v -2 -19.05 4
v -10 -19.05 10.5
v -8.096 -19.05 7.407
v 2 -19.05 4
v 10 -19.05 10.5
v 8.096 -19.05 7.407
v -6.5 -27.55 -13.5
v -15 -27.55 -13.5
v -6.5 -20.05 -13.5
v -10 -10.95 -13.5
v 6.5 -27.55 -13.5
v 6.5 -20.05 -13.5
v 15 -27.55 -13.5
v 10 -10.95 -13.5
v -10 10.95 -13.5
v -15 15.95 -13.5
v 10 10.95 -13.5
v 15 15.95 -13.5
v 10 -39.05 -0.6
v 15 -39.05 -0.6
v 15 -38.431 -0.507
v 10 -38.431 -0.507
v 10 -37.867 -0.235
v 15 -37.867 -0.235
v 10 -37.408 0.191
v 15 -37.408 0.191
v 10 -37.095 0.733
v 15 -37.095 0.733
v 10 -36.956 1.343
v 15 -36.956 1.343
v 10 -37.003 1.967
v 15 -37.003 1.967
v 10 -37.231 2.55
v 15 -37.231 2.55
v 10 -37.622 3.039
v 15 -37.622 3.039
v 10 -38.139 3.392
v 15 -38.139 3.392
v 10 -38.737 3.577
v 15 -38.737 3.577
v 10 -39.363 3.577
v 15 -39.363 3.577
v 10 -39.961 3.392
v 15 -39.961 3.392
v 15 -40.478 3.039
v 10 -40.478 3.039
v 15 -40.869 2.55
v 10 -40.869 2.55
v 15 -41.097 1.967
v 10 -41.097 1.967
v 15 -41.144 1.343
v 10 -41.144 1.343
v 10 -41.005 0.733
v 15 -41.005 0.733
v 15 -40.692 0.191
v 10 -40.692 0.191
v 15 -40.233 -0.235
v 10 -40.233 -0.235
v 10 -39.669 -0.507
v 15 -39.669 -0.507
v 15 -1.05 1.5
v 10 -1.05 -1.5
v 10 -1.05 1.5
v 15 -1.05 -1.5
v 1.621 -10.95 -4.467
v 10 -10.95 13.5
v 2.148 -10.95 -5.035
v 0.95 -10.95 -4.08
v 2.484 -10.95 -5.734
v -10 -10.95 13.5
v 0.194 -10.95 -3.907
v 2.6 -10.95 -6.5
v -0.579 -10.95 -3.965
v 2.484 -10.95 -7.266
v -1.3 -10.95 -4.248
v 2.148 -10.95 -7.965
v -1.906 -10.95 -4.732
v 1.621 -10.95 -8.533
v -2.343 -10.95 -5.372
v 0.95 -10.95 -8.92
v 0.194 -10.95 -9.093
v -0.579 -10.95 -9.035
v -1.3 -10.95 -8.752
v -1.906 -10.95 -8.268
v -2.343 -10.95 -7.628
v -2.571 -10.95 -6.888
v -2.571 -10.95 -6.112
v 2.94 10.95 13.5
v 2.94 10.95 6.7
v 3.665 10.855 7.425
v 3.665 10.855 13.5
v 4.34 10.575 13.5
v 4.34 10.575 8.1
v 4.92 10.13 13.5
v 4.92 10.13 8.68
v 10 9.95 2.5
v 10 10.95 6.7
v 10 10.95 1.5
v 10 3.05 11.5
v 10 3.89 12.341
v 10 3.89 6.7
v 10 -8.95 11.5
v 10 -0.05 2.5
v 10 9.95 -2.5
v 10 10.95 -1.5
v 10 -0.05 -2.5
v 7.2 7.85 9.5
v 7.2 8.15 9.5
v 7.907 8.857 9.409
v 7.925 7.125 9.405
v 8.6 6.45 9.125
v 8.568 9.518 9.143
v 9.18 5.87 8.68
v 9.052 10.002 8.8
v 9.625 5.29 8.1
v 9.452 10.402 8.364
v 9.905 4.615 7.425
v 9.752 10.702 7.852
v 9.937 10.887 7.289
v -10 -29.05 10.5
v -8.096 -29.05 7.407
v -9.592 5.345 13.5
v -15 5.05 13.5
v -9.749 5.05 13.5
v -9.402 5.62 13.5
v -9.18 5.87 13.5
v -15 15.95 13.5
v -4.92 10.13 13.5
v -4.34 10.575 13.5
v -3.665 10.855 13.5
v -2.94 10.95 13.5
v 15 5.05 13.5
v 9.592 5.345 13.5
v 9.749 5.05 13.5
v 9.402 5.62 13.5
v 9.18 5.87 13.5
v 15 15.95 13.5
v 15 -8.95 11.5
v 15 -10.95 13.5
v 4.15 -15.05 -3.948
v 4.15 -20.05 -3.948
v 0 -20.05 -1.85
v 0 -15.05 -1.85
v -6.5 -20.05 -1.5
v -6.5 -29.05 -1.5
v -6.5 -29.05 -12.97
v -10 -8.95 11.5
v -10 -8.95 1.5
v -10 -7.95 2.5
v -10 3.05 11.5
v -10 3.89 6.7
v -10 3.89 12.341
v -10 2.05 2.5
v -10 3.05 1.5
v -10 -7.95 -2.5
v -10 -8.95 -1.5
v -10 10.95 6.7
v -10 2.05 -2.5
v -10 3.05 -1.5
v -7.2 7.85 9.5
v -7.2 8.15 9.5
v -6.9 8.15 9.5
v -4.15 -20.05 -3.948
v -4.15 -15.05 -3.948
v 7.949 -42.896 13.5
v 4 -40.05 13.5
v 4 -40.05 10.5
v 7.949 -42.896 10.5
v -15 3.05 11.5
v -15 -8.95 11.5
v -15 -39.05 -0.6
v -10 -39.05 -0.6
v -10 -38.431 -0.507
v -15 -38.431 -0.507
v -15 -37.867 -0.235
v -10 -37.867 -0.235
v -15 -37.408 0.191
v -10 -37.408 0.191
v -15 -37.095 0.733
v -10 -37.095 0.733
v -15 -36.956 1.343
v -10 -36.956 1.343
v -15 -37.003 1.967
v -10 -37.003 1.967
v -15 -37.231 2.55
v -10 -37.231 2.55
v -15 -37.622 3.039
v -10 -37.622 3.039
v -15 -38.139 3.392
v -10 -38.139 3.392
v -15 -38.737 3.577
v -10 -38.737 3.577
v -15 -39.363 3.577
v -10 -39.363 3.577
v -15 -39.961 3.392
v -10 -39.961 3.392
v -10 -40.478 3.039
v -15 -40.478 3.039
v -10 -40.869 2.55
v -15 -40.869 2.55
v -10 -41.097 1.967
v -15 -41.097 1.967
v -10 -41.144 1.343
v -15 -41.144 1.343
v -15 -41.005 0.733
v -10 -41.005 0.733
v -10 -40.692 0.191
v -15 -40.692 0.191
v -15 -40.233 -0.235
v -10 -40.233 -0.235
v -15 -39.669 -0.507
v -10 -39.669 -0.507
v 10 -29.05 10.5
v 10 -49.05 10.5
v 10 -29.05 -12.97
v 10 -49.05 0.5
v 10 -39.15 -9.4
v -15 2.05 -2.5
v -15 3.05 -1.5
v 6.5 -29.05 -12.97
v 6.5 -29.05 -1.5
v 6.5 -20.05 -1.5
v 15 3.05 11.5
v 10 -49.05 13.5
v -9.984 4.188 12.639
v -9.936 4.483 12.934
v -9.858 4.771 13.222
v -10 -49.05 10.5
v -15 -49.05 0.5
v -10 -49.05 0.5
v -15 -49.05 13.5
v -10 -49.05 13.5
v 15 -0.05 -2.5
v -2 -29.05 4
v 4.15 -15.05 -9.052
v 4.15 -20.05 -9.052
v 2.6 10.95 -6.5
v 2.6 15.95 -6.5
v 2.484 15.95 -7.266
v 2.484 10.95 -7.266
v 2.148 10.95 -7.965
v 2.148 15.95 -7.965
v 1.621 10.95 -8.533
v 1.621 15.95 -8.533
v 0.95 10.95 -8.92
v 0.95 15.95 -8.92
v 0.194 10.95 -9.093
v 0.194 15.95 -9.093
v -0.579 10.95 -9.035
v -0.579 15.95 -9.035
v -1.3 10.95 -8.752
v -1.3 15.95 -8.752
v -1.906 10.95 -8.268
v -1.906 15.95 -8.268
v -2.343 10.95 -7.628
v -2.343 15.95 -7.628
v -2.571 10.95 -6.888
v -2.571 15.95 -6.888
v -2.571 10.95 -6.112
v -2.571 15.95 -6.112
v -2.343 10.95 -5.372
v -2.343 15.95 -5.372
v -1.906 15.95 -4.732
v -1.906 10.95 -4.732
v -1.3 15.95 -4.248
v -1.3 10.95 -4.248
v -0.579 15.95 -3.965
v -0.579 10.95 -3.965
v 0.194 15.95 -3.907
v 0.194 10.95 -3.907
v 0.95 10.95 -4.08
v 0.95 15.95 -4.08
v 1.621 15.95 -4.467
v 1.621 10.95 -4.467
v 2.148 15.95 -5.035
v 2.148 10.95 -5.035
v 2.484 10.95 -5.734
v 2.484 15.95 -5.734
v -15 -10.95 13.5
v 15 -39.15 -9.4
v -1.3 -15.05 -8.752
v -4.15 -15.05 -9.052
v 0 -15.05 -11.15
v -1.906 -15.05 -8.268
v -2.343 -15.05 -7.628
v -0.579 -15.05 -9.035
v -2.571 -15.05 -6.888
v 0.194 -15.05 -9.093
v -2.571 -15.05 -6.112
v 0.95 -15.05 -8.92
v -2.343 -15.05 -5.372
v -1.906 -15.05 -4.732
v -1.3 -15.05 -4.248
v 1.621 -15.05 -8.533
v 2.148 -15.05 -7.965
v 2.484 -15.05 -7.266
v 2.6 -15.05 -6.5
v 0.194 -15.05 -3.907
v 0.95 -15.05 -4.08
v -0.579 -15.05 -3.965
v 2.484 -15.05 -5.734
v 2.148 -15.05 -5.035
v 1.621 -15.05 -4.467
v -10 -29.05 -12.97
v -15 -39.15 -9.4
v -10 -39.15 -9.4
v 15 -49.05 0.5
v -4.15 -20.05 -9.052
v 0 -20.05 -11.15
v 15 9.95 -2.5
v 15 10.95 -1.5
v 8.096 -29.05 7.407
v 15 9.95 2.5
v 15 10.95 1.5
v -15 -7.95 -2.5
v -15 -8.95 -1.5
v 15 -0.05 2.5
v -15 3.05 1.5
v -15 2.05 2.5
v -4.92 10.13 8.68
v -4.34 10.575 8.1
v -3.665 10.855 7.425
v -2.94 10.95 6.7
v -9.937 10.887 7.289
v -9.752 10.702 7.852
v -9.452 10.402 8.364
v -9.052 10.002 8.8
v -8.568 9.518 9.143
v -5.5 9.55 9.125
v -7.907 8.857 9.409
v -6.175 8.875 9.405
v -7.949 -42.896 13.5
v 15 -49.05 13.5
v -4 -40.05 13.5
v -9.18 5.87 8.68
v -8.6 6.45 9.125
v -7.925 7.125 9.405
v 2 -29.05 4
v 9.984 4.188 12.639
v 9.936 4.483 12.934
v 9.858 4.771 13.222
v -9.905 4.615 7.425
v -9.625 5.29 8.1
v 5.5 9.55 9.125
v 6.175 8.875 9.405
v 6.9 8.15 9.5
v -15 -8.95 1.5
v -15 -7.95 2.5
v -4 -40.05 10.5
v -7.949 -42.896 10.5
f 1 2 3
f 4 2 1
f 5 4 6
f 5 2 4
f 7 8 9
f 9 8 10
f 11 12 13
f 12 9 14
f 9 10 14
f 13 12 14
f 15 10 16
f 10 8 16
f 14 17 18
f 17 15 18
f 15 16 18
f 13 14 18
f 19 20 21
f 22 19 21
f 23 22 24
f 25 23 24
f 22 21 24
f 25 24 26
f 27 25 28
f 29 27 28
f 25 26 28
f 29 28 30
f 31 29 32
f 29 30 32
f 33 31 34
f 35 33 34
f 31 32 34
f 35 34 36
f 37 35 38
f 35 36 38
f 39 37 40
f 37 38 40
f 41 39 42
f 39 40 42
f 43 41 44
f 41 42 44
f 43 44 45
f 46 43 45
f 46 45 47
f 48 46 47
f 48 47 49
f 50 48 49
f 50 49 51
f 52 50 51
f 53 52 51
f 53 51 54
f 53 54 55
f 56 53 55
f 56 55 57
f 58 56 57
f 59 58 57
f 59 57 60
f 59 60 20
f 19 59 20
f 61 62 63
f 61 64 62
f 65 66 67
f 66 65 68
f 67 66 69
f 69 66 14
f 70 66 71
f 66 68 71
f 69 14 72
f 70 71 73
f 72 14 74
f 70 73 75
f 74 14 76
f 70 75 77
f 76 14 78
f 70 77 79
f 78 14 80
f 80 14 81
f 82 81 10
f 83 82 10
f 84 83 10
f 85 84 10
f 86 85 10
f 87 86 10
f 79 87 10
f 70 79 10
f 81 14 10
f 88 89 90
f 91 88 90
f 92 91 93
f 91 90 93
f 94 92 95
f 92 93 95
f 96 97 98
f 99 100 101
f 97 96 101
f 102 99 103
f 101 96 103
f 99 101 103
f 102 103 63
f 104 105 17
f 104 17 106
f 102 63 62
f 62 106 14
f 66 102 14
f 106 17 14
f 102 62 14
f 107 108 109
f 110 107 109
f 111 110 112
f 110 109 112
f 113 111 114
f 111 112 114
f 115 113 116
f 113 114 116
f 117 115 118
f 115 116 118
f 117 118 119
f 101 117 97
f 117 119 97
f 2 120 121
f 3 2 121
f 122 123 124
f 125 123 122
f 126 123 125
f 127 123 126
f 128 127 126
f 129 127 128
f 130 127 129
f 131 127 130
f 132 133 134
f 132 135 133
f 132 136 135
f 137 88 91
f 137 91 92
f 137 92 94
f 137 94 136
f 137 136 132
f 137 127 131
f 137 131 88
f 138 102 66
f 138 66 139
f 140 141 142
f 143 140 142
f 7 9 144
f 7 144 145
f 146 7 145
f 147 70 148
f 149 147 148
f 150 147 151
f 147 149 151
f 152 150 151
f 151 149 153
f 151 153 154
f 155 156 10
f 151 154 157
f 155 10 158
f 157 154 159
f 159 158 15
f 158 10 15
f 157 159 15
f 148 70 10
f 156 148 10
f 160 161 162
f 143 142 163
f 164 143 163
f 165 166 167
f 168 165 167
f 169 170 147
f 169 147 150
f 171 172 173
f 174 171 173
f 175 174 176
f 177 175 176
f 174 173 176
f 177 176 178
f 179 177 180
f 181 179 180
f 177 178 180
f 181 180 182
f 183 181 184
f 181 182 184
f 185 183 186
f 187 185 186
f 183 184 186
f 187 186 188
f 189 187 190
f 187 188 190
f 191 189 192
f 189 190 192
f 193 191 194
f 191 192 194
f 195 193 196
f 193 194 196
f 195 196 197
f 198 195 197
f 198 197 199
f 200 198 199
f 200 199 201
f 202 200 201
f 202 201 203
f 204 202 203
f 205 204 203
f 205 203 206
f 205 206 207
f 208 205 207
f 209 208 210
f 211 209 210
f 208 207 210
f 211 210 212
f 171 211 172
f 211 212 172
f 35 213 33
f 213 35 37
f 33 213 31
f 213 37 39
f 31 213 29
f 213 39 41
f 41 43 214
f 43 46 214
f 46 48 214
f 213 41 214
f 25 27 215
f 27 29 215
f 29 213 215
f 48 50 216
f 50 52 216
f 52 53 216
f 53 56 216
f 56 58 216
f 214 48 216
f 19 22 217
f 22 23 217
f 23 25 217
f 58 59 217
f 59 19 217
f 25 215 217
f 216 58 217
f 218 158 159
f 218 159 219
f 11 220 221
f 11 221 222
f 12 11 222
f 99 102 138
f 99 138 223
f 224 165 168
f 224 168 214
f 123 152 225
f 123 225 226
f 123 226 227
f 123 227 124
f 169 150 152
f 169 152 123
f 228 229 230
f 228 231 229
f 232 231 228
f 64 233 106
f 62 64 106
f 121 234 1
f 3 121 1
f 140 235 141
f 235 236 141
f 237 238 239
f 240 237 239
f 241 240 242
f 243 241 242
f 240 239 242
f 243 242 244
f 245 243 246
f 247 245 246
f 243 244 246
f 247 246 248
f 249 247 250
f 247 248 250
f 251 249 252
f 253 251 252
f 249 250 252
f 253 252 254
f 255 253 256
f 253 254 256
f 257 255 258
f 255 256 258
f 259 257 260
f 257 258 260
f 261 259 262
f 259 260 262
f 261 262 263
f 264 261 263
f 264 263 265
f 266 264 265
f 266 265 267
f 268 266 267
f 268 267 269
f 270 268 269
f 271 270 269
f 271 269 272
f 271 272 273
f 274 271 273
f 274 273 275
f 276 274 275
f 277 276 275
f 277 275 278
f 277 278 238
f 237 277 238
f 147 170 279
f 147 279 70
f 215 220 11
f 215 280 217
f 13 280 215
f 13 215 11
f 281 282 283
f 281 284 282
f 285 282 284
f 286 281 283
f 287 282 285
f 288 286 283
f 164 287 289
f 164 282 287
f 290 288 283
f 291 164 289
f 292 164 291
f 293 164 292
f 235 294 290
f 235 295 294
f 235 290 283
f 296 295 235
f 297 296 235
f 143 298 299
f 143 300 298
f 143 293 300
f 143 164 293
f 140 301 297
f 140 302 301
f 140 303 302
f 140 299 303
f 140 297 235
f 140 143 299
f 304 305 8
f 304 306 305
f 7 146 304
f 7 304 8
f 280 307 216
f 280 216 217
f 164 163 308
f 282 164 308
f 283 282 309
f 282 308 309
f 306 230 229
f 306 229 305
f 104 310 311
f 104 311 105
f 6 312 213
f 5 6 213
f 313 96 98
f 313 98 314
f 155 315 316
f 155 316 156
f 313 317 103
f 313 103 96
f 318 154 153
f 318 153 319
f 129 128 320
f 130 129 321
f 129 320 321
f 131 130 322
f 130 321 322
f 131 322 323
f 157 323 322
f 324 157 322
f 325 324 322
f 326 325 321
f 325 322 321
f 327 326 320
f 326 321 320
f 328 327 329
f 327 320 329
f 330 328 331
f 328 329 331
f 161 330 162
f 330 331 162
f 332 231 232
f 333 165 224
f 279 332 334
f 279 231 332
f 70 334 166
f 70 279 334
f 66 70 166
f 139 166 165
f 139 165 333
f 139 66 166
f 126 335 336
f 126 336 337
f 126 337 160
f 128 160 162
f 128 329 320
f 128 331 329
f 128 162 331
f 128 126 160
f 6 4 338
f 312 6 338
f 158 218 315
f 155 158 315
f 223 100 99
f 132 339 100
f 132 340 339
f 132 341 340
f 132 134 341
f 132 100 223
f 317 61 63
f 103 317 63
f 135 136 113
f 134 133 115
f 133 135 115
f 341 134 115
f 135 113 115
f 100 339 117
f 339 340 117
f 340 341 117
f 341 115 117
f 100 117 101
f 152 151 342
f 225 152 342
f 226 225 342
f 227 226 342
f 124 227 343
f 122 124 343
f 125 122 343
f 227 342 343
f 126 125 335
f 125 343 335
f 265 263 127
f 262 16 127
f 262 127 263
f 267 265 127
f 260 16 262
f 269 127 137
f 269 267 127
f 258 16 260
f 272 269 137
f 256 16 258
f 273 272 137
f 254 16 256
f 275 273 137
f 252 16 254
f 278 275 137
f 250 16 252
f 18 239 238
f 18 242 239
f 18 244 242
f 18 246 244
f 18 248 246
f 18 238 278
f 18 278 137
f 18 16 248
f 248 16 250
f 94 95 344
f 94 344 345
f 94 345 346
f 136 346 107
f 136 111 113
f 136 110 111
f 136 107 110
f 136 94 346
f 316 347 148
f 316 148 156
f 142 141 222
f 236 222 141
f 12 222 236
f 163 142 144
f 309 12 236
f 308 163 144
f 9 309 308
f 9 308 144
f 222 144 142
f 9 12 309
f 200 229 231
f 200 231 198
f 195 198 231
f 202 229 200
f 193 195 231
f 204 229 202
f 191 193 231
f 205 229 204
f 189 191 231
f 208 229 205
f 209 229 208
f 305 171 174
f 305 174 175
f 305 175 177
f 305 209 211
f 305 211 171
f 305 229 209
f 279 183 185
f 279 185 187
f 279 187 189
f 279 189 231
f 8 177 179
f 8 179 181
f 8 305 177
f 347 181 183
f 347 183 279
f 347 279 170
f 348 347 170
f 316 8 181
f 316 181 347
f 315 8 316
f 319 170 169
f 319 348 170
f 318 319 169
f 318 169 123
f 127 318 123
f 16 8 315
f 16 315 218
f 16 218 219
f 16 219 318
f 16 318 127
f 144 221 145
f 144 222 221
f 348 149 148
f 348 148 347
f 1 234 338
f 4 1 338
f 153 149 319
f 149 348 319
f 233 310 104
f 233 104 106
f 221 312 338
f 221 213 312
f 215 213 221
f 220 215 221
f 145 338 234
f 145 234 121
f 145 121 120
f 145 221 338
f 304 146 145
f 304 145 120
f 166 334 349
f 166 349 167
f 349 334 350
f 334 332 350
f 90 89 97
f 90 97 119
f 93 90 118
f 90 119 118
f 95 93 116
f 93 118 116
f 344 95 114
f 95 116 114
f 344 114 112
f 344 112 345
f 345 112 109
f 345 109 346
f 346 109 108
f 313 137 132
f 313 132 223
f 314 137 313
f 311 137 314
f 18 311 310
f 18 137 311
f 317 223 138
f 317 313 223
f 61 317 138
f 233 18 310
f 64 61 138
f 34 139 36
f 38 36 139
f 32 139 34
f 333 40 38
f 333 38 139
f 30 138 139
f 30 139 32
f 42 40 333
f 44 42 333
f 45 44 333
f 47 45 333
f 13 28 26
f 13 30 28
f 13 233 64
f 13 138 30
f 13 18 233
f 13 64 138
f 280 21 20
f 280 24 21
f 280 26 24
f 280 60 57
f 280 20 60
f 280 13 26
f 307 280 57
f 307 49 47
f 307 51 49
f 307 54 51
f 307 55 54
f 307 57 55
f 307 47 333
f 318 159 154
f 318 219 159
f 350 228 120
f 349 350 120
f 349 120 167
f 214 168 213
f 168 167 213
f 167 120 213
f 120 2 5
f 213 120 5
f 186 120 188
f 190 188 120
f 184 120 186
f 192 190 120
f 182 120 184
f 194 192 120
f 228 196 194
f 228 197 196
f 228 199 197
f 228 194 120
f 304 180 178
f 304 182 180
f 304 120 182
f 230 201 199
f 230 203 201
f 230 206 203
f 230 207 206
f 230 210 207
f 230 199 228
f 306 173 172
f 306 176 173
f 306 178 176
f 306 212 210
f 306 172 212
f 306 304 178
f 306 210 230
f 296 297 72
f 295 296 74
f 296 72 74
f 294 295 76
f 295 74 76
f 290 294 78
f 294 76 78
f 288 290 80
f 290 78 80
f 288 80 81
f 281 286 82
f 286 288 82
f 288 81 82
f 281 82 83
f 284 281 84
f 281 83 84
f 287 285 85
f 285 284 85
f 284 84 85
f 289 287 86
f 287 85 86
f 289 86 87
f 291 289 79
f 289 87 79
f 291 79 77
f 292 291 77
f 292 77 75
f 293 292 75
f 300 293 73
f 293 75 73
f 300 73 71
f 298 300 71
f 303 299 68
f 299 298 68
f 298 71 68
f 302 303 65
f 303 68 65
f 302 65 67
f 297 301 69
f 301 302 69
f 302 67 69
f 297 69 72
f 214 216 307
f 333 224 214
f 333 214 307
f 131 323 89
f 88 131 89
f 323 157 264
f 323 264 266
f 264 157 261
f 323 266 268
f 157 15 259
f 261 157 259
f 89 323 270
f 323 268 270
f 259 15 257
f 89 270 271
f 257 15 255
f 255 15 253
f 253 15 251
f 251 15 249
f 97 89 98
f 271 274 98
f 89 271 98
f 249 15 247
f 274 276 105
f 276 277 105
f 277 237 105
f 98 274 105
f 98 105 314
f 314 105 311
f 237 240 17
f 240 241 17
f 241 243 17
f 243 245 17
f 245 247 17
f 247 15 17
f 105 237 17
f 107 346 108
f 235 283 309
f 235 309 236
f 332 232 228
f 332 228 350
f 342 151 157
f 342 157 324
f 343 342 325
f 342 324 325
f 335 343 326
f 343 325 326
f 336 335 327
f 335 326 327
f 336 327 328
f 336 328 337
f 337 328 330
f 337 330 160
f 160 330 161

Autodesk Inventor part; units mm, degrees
ref_plane "YZ Plane" through (0, 0, 0) normal (1, 0, 0) x (0, 1, 0)
ref_plane "XZ Plane" through (0, 0, 0) normal (0, 1, 0) x (-1, 0, 0)
ref_plane "XY Plane" through (0, 0, 0) normal (0, 0, 1) x (1, 0, 0)
sketch "Sketch1" plane through (0, 0, 0) normal (0, 0, 1) x (1, 0, 0)
  line L0 (-10, 10.95) -> (10, 10.95)
  line L1 (10, 10.95) -> (10, -10.95)
  line L2 (10, -10.95) -> (-10, -10.95)
  line L3 (-10, -10.95) -> (-10, 10.95)
  line L4 (-15, 15.95) -> (15, 15.95)
  line L5 (15, 15.95) -> (15, -29.05)
  line L6 (15, -29.05) -> (10, -29.05) construction
  line L7 (-15, -29.05) -> (-15, 15.95)
  line L8 (-15, -29.05) -> (-10, -29.05) construction
  line L9 (-10, -29.05) -> (-10, -49.05)
  line L10 (-10, -49.05) -> (-15, -49.05)
  line L11 (-15, -49.05) -> (-15, -29.05)
  line L12 (15, -29.05) -> (10, -29.05) construction
  line L13 (10, -29.05) -> (10, -49.05)
  line L14 (10, -49.05) -> (15, -49.05)
  line L15 (15, -49.05) -> (15, -29.05)
  line L16 (-10, -29.05) -> (-15, -29.05) construction
  line L17 (10, -29.05) -> (-10, -29.05)
  point P0 (0, 0)
  point P1 (0, 10.95)
  point P2 (10, 0)
  dimension "d0" = 20
  dimension "d1" = 21.9
  dimension "d2" = 5
  dimension "d3" = 5
  dimension "d4" = 5
  dimension "d5" = 18.1
  dimension "d6" = 20
extrude "Extrusion1" add sketch "Sketch1" along normal mid plane 27
sketch "Sketch3" plane through (-15, 15.95, 13.5) normal (0, 1, 0) x (1, 0, 0)
  circle A0 centre (15, 20) radius 2.6
  line L0 (0, 27) -> (30, 27) projected
  point P0 (15, 13.5)
  point P1 (15, 27)
  dimension "d9" = 5.2
  dimension "d10" = 7
extrude "Extrusion2" cut sketch "Sketch3" against normal through all
sketch "Sketch4" plane through (-10, -29.05, 13.5) normal (0, -1, 0) x (1, 0, 0)
  circle A0 centre (10, -20) radius 2.6 projected
  line L0 (14.15, -22.5524) -> (14.15, -17.4476)
  line L1 (14.15, -17.4476) -> (10, -15.35)
  line L2 (10, -15.35) -> (5.85, -17.4476)
  line L3 (5.85, -17.4476) -> (5.85, -22.5524)
  line L4 (5.85, -22.5524) -> (10, -24.65)
  line L5 (10, -24.65) -> (14.15, -22.5524)
  point P0 (10, -13.5)
  point P1 (14.15, -20)
  dimension "d13" = 9.3
  dimension "d14" = 8.3
  dimension "d15" = 8.3
extrude "Extrusion3" cut sketch "Sketch4" against normal blind 14
sketch "Sketch5" plane through (0, 0, 13.5) normal (0, 0, 1) x (1, 0, 0)
  line L0 (10, -29.05) -> (10, -49.05) projected
  line L1 (-10, -29.05) -> (10, -29.05) projected
  line L2 (-10, -49.05) -> (-10, -29.05) projected
  line L3 (10, -29.05) -> (-10, -29.05)
  line L4 (-10, -29.05) -> (-10, -49.05)
  line L5 (-10, -49.05) -> (10, -49.05)
  line L6 (10, -49.05) -> (10, -29.05)
  point P0 (0, 0)
extrude "Extrusion4" add sketch "Sketch5" against normal blind 3
sketch "Sketch6" plane through (15, -49.05, 13.5) normal (1, 0, 0) x (0, 0, -1)
  line L0 (27, 60) -> (27, 38.1) projected
  line L1 (11, 60) -> (16, 60)
  line L2 (16, 60) -> (16, 48)
  line L3 (16, 48) -> (11, 48)
  line L4 (11, 48) -> (11, 60)
  line L5 (17.4, 65) -> (22.6, 65) projected
  line L6 (0, 65) -> (27, 65) projected
  point P0 (13.5, 49.05)
  point P1 (20, 65)
  point P2 (20, 65)
  dimension "d20" = 5
  dimension "d21" = 12
  dimension "d32" = 4
extrude "Extrusion5" cut sketch "Sketch6" against normal up to next
sketch "Sketch7" plane through (-15, -49.05, 13.5) normal (-1, 0, 0) x (0, 0, 1)
  line L0 (-11, 48) -> (-11, 60) projected
  line L1 (-11, 60) -> (-16, 60) projected
  line L2 (-16, 60) -> (-16, 48) projected
  line L3 (-16, 48) -> (-11, 48) projected
  line L4 (0, 65) -> (-27, 65) projected
  line L5 (0, 0) -> (0, 65) projected
  line L6 (0, 0) -> (-27, 0) projected
  line L7 (-27, 65) -> (-27, 0) projected
  line L8 (-16, 52.1) -> (-11, 52.1)
  line L9 (-11, 52.1) -> (-11, 40.1)
  line L10 (-11, 40.1) -> (-16, 40.1)
  line L11 (-16, 40.1) -> (-16, 52.1)
  point P0 (-13.5, 49.05)
  point P1 (-27, 38.1)
  dimension "d25" = 5
  dimension "d26" = 12
  dimension "d62" = 2
extrude "Extrusion6" cut sketch "Sketch7" against normal up to next contours L3 L2 L8 L0 | L9 L10 L11 L3
chamfer "Chamfer1" distance 1 angle 45 8 edges at (-12.5, 3.05, 2.5) (-12.5, 3.05, -2.5) (12.5, -1.05, 2.5) (12.5, -1.05, -2.5) (-12.5, -8.95, -2.5) (-12.5, -8.95, 2.5) (12.5, 10.95, 2.5) (12.5, 10.95, -2.5)
sketch "Sketch8" plane through (15, -49.05, 13.5) normal (1, 0, 0) x (0, 0, -1)
  circle A0 centre (12, 10) radius 2.1
  line L0 (0, 0) -> (27, 0) projected
  point P0 (13.5, 49.05)
  dimension "d33" = 4.2
  dimension "d34" = 10
  dimension "d35" = 15
extrude "Extrusion7" cut sketch "Sketch8" against normal through all
sketch "Sketch9" plane through (0, 0, 13.5) normal (0, 0, 1) x (1, 0, 0)
  line L0 (10, -29.05) -> (-10, -29.05) projected
  line L1 (10, -49.05) -> (10, -29.05) projected
  line L2 (10, -49.05) -> (-10, -49.05) projected
  line L3 (-10, -29.05) -> (-10, -49.05) projected
  line L4 (-10, -49.05) -> (-7, -40.05)
  line L5 (-7, -40.05) -> (7, -40.05)
  line L6 (10, -49.05) -> (10, -29.05) projected
  line L7 (7, -40.05) -> (10, -49.05)
  point P0 (0, 0)
  dimension "d38" = 9
  dimension "d39" = 3
extrude "Extrusion8" cut sketch "Sketch9" against normal up to next contours L2 L4 L5 L7
chamfer "Chamfer2" distance 3 angle 45 2 edges at (-7, -40.05, 12) (7, -40.05, 12)
sketch "Sketch10" plane through (-10, -29.05, -13.5) normal (0, -1, 0) x (1, 0, 0)
  line L0 (20, 24) -> (0, 24) projected
  line L1 (0, 24) -> (0, 0) projected
  line L2 (20, 0) -> (0, 0) projected
  line L3 (20, 24) -> (20, 0) projected
  line L4 (10, 11.65) -> (14.15, 9.5524) projected
  line L5 (14.15, 9.5524) -> (14.15, 4.4476) projected
  line L6 (14.15, 4.4476) -> (10, 2.35) projected
  line L7 (10, 2.35) -> (5.85, 4.4476) projected
  line L8 (5.85, 4.4476) -> (5.85, 9.5524) projected
  line L9 (5.85, 9.5524) -> (10, 11.65) projected
  line L10 (20, 24) -> (0, 24) projected
  line L11 (0, 24) -> (4, 17.5)
  line L12 (4, 17.5) -> (16, 17.5)
  line L13 (16, 17.5) -> (20, 24)
  point P0 (10, 13.5)
  point P1 (10, 17.5)
  point P2 (10, 24)
  dimension "d45" = 6.5
  dimension "d46" = 12
extrude "Extrusion9" cut sketch "Sketch10" against normal blind 10 contours L13 L12 L11 L0
chamfer "Chamfer3" distance 4 angle 45 2 edges at (6, -24.05, 4) (-6, -24.05, 4)
sketch "Sketch11" plane through (0, 0, -13.5) normal (0, 0, -1) x (-1, 0, 0)
  line L0 (8.0964, -29.05) -> (2, -29.05) projected
  line L1 (-6.5, -20.05) -> (6.5, -20.05)
  line L2 (6.5, -20.05) -> (6.5, -29.05)
  line L3 (6.5, -29.05) -> (-6.5, -29.05)
  line L4 (-6.5, -29.05) -> (-6.5, -20.05)
  line L5 (-10, -29.05) -> (10, -29.05) projected
  point P0 (0, 0)
  point P1 (0, -20.05)
  point P2 (0, -29.05)
  dimension "d52" = 13
  dimension "d53" = 9
extrude "Extrusion10" cut sketch "Sketch11" against normal blind 12
sketch "Sketch12" plane through (15, -49.05, 13.5) normal (1, 0, 0) x (0, 0, -1)
  line L0 (0, 0) -> (27, 0) projected
  line L1 (13, 0) -> (27, 14)
  line L2 (27, 65) -> (27, 0) projected
  line L3 (22.9, 9.9) -> (27, 21.5)
  point P0 (13.5, 49.05)
  dimension "d56" = 45
  dimension "d57" = 14
  dimension "d58" = 4.1
  dimension "d59" = 7.5
extrude "Extrusion11" cut sketch "Sketch12" against normal through all
sketch "Sketch13" plane through (-15, -49.05, 13.5) normal (-1, 0, 0) x (0, 0, 1)
  line L0 (-16, 41.1) -> (-16, 51.1) projected
  line L1 (-12, 40.1) -> (-15, 40.1) projected
  line L2 (-22.9, 9.9) -> (-13, 0) projected
  line L3 (0, 0) -> (-13, 0) projected
  line L4 (0, 65) -> (0, 0) projected
  line L5 (-27, 65) -> (0, 65) projected
  line L6 (-27, 21.5) -> (-27, 65) projected
  line L7 (-27, 21.5) -> (-22.9, 9.9) projected
  circle A0 centre (-12, 10) radius 2.1 projected
  line L8 (-12, 40.1) -> (-15, 40.1) projected
  line L9 (-16, 41.1) -> (-15, 40.1) projected
  line L10 (-16, 41.1) -> (-16, 51.1) projected
  line L11 (-15, 52.1) -> (-16, 51.1) projected
  line L12 (-15, 52.1) -> (-12, 52.1) projected
  line L13 (-11, 51.1) -> (-12, 52.1) projected
  line L14 (-11, 51.1) -> (-11, 41.1) projected
  line L15 (-12, 40.1) -> (-11, 41.1) projected
  line L16 (0, 38.1) -> (0, 60) projected
  line L17 (0, 40.1) -> (-2, 40.1)
  line L18 (-2, 40.1) -> (-2, 52.1)
  line L19 (-2, 52.1) -> (0, 52.1)
  point P0 (-13.5, 49.05)
  dimension "d63" = 2
extrude "Extrusion12" cut sketch "Sketch13" against normal through all contours L17 L18 L19 L4
chamfer "Chamfer4" distance 2 angle 45 4 edges at (-12.5, -8.95, 13.5) (-12.5, 3.05, 13.5) (12.5, -8.95, 13.5) (12.5, 3.05, 13.5)
sketch "Sketch14" plane through (0, 0, 13.5) normal (0, 0, 1) x (1, 0, 0)
  line L0 (-10, 5.05) -> (-10, 10.95) projected
  line L1 (-10, 5.05) -> (-4.1, 10.95)
  line L2 (10, -0.05) -> (10, 9.95) projected
  line L3 (-10, 10.95) -> (10, 10.95) projected
  line L4 (10, 10.95) -> (4.1, 10.95)
  line L5 (10, 5.05) -> (10, 10.95)
  line L6 (4.1, 10.95) -> (10, 5.05)
  point P0 (0, 0)
  dimension "d69" = 45
extrude "Extrusion13" add sketch "Sketch14" against normal blind 4
fillet "Fillet1" radius 2.8 8 edges at (-7.05, 10.95, 9.5) (-10, 8, 9.5) (10, 8, 9.5) (7.05, 10.95, 9.5) (4.1, 10.95, 11.5) (-4.1, 10.95, 11.5) (-10, 5.05, 11.5) (10, 5.05, 11.5)
equation "\"d4\" = d3"
properties part number "holder-GT2-x-carriage-V2-right"
